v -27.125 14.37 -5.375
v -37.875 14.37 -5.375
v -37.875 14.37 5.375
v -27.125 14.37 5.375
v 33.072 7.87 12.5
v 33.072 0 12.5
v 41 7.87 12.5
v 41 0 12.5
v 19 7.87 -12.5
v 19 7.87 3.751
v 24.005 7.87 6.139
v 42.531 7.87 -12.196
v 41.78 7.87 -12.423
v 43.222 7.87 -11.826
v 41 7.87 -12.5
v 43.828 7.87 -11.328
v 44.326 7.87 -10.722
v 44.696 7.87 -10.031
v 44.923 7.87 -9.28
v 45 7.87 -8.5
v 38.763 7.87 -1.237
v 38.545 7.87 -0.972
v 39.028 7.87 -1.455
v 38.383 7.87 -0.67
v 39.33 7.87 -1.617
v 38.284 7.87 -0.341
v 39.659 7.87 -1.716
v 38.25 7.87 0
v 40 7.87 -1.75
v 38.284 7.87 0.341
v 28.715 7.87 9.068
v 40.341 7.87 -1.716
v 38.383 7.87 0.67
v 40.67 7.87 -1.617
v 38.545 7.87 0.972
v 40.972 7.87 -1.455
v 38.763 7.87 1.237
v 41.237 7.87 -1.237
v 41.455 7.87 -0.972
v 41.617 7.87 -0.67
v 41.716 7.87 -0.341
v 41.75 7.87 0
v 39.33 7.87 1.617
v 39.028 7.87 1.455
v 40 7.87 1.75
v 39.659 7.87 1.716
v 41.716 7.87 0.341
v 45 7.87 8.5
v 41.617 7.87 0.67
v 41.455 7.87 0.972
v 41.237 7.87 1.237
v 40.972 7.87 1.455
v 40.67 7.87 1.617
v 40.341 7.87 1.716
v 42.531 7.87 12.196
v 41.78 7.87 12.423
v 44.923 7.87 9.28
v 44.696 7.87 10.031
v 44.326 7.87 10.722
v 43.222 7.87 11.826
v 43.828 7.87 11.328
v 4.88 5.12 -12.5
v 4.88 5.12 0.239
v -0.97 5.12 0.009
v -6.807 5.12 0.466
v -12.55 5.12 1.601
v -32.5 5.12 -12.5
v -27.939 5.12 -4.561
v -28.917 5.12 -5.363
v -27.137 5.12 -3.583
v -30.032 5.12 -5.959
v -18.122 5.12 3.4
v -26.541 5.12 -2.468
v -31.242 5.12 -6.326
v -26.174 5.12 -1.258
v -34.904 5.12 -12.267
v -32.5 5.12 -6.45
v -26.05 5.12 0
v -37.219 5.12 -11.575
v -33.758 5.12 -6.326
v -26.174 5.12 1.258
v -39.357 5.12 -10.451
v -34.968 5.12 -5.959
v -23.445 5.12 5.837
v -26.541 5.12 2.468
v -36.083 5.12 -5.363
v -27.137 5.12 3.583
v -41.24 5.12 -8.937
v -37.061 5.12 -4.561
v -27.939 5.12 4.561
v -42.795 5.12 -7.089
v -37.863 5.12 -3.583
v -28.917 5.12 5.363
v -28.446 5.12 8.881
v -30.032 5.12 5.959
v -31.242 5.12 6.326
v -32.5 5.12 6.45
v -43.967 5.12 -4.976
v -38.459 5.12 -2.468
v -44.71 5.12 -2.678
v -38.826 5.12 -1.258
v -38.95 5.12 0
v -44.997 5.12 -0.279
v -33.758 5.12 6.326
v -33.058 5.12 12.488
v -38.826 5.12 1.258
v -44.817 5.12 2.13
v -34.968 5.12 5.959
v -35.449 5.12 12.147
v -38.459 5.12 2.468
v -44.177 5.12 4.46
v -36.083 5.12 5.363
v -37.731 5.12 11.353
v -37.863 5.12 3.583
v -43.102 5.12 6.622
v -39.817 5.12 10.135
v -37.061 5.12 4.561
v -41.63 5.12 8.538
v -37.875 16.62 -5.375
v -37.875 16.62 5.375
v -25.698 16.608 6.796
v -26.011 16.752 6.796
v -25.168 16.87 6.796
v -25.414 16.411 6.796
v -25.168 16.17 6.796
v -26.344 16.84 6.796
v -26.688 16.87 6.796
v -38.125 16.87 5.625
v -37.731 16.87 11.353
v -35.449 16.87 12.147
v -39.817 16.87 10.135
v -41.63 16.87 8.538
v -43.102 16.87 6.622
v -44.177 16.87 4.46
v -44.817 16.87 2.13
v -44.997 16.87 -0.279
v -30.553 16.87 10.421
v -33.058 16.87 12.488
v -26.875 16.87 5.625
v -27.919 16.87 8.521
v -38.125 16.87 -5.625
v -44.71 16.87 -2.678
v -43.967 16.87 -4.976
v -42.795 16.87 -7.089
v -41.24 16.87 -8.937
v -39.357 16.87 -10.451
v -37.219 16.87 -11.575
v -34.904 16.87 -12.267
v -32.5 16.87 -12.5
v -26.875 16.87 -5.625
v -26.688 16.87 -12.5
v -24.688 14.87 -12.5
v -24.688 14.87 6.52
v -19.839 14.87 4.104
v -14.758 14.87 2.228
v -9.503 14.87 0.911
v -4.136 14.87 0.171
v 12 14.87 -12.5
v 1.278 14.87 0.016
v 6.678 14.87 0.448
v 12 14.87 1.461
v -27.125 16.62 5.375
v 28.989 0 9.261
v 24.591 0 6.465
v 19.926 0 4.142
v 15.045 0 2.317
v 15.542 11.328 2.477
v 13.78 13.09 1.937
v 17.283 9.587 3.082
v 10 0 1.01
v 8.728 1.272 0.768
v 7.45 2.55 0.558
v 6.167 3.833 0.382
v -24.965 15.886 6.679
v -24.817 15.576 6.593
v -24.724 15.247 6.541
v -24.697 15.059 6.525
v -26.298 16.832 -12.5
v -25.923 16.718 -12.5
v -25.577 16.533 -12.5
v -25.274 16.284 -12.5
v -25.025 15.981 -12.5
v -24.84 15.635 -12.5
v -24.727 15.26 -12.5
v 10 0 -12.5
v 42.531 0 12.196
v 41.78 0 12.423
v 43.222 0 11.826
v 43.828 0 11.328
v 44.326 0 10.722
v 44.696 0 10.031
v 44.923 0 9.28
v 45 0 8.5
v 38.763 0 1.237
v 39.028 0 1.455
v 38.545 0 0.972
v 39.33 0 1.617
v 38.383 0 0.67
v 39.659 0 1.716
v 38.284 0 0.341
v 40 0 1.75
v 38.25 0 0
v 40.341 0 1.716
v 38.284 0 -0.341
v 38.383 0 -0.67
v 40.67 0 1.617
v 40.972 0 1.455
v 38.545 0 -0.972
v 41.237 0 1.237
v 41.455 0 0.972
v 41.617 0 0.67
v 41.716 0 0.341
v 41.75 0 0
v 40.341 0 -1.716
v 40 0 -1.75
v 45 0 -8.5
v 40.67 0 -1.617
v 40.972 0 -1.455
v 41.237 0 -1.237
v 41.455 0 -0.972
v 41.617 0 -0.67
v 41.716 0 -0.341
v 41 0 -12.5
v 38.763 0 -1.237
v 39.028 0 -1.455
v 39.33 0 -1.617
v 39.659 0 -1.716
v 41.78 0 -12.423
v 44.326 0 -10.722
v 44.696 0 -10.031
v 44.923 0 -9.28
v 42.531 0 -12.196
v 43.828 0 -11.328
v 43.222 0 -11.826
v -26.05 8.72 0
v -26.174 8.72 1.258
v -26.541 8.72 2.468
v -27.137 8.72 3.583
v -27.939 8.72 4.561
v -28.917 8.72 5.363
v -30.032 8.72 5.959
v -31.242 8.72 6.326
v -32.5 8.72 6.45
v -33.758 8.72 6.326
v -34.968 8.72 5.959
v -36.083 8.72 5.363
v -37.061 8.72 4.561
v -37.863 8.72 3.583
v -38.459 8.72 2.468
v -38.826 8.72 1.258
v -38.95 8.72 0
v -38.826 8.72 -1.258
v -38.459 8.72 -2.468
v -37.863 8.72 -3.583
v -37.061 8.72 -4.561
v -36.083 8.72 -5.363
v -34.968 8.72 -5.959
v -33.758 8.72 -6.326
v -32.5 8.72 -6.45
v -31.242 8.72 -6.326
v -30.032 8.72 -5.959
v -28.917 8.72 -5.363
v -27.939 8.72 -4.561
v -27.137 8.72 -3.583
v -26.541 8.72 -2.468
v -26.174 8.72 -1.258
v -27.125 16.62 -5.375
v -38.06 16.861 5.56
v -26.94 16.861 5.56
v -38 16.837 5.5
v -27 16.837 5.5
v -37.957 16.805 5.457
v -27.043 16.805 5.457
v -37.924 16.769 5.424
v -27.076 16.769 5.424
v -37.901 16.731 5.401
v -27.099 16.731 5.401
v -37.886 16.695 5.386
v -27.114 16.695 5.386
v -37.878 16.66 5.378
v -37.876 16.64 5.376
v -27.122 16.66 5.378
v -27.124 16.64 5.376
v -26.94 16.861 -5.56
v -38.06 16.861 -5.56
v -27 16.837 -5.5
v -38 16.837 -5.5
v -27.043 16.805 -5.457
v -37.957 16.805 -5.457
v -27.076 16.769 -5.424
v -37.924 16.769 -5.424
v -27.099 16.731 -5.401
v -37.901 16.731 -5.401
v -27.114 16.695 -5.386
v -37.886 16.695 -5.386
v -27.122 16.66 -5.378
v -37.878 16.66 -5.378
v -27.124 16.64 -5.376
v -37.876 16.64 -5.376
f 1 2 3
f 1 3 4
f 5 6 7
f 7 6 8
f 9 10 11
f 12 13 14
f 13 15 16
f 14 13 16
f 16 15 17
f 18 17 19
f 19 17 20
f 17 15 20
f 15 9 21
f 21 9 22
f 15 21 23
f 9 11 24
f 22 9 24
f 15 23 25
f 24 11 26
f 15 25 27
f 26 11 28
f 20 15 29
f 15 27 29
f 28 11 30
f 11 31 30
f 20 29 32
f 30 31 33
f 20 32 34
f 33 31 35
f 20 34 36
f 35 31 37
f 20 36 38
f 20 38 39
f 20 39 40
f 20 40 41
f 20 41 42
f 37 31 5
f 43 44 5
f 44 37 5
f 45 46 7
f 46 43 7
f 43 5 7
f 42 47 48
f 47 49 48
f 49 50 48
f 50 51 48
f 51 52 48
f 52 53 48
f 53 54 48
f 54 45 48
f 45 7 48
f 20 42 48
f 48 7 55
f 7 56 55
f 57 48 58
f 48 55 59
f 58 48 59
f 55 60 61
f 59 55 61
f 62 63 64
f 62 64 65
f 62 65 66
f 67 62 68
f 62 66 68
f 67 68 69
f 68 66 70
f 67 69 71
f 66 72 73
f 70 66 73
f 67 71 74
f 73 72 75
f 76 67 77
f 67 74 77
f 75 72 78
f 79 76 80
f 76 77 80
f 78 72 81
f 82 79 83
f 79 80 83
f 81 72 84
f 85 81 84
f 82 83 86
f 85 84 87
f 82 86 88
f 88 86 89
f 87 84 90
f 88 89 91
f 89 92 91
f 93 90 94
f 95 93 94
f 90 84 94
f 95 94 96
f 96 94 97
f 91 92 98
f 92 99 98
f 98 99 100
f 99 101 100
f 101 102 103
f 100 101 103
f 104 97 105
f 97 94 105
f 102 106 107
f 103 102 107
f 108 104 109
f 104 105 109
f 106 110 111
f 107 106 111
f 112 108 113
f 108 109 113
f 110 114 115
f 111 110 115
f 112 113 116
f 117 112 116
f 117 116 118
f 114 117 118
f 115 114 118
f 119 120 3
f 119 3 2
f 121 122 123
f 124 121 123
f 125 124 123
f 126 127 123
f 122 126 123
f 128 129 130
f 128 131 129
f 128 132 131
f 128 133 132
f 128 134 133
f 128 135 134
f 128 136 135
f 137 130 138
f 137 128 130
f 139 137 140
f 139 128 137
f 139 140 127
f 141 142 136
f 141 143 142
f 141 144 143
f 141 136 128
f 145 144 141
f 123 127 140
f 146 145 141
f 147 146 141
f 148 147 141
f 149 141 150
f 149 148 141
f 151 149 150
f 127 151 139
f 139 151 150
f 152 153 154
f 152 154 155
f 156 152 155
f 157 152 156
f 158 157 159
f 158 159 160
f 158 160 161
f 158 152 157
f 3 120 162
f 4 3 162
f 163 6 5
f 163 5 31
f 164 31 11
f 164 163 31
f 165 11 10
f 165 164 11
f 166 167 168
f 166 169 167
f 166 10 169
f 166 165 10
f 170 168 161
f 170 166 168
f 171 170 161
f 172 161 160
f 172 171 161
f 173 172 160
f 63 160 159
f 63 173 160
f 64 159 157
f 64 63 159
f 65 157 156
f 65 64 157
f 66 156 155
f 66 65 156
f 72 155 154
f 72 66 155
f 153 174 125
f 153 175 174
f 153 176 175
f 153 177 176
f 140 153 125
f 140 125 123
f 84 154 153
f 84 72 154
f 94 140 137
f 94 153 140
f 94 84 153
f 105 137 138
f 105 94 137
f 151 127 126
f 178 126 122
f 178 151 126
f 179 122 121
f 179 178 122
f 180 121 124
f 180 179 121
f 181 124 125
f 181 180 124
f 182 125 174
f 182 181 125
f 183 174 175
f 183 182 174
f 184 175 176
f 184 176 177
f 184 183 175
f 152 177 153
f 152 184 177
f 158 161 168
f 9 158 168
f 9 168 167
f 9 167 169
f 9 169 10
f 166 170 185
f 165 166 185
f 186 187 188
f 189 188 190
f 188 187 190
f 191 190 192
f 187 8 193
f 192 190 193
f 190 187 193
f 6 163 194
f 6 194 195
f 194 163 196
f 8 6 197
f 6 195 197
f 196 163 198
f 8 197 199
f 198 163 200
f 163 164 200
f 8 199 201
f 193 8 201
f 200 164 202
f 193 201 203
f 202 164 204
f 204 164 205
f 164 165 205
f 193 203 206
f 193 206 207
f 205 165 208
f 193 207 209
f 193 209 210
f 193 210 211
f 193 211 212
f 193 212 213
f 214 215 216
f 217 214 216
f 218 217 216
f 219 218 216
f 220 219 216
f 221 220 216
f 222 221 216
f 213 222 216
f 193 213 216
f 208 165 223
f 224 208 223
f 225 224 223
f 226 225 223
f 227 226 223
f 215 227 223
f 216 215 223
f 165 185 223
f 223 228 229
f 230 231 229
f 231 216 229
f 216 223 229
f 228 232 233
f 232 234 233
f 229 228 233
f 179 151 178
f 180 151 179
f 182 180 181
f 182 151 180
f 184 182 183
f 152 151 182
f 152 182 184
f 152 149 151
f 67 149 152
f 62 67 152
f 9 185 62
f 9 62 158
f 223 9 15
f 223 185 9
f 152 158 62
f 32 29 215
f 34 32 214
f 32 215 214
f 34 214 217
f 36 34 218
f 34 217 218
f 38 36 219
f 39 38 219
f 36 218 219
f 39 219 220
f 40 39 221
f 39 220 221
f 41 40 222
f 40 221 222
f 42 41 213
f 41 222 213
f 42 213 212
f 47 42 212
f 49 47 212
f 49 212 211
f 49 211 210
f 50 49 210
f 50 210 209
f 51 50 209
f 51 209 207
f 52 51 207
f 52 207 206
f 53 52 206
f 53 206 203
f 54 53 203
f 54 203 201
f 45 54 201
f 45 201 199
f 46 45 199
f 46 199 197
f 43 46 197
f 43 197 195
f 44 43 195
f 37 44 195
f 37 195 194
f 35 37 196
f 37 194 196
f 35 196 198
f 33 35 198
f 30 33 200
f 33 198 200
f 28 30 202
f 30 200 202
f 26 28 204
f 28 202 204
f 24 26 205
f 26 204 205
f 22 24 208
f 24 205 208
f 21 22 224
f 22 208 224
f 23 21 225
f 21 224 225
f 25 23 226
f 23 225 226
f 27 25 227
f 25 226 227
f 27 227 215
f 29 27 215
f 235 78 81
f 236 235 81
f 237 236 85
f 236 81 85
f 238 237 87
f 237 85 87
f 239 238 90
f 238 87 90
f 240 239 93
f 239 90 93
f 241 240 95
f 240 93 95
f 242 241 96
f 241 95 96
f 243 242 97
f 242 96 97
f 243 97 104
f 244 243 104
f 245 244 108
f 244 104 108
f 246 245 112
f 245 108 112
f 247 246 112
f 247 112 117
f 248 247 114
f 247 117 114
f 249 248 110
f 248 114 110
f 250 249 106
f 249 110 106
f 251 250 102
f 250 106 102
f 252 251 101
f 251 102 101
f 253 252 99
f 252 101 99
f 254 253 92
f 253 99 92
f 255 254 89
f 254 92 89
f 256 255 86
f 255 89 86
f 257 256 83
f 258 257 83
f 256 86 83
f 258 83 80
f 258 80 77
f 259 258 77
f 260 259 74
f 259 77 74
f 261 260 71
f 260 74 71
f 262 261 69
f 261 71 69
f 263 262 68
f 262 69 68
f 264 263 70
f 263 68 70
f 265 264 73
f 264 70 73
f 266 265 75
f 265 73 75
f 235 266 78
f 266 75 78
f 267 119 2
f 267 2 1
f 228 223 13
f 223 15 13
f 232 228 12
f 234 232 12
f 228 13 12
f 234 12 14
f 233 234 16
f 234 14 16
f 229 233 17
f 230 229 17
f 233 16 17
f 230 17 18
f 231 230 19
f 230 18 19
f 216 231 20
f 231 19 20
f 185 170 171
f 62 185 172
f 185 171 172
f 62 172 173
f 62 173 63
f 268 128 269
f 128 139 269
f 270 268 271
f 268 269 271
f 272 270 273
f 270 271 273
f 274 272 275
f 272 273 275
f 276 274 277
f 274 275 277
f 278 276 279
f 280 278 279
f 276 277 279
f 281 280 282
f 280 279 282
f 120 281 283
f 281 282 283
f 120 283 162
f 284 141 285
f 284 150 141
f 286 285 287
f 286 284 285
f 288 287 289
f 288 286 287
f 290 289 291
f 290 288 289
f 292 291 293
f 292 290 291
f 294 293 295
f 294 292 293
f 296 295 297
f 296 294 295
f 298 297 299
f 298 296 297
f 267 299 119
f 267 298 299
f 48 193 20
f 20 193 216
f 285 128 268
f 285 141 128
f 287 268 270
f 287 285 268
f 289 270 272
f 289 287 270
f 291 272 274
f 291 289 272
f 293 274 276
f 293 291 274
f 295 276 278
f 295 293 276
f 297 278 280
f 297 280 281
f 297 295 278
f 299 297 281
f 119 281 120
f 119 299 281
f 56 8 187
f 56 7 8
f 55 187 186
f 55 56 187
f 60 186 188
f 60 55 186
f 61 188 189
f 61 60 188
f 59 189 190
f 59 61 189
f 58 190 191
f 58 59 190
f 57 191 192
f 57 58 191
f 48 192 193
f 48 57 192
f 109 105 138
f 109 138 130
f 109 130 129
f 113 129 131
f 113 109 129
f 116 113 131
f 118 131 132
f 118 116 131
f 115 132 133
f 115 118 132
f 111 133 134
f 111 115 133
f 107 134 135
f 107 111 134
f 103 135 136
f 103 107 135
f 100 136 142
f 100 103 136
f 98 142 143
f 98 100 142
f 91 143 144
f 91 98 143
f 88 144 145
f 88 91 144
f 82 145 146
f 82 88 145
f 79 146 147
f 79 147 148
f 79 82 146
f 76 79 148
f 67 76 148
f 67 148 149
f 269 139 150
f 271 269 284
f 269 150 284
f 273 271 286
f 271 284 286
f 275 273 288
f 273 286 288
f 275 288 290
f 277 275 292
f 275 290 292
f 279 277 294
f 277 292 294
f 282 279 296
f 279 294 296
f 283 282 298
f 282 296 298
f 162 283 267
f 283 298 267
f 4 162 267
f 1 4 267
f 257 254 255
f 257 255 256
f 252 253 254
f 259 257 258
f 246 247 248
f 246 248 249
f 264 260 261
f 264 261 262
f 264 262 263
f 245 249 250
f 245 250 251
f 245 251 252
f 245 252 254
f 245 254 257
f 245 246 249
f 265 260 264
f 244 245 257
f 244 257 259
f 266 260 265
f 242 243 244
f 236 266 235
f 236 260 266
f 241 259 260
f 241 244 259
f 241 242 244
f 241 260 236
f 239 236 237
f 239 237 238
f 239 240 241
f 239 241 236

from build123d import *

# Parameters (mm, degrees)
SKETCH1_W                    = 90
SKETCH1_H                    = 25
BOSS_EXTRUDE1_DEPTH          = 16.87
SKETCH3_W                    = 10.75
SKETCH3_H                    = 10.75
CUT_EXTRUDE2_DEPTH           = 2.5
ENL_V_MAT_EXTRU_1_DEPTH      = 34
FILLET1_RADIUS               = 12.5
FILLET1_LENGTH               = 11.75
ESQUISSE5_R                  = 1.75
ENL_V_MAT_EXTRU_4_DEPTH      = 50.65729453
FILLET3_R                    = 4
SKETCH8_W                    = 38.029495875
SKETCH8_H                    = 20.943583685
CUT_EXTRUDE6_DEPTH           = 2
FILLET6_R                    = 2
FILLET7_R                    = 0.25
ESQUISSE17_R                 = 6.45
ENL_V_MAT_EXTRU_7_DEPTH      = 3.6
ENL_V_MAT_EXTRU_8_DEPTH      = 50.65729453
ENL_V_MAT_EXTRU_8_DEPTH_BACK = 50.65729453
ESQUISSE18_R                 = 50


with BuildPart() as part:
    # Sketch1 → Boss-Extrude1 (new body)
    with BuildSketch(Plane(origin=(0, 0, 0), x_dir=(1, 0, 0), z_dir=(0, 1, 0))):
        Rectangle(SKETCH1_W, SKETCH1_H)
    extrude(amount=BOSS_EXTRUDE1_DEPTH)

    # Sketch3 → Cut-Extrude2 (cut)
    with BuildSketch(Plane(origin=(0, 16.87, 0), x_dir=(1, 0, 0), z_dir=(0, 1, 0))):
        with Locations((-32.5, 0)):
            Rectangle(SKETCH3_W, SKETCH3_H)
    extrude(amount=-CUT_EXTRUDE2_DEPTH, mode=Mode.SUBTRACT)

    # Esquisse2 → Enlèv. mat.-Extru.1 (cut)
    with BuildSketch(Plane.XY.offset(12.5)):
        Polygon((45, 16.87), (10, 16.87), (19, 7.87), (45, 7.87), align=None)
        Polygon((-45, 0), (10, 0), (4.88, 5.12), (-45, 5.12), align=None)
    extrude(amount=-ENL_V_MAT_EXTRU_1_DEPTH, mode=Mode.SUBTRACT)

    # Fillet1: full round fillet: the end face becomes a half cylinder, R = half its width
    fillet1_face = Plane((-45, 10.995, 0), x_dir=(0, -1, 0), z_dir=(-1, 0, 0))  # on the end face: x along it, z out of the body
    fillet1_slab = fillet1_face.offset(-FILLET1_RADIUS / 2) * Box(FILLET1_LENGTH, 2 * FILLET1_RADIUS, FILLET1_RADIUS, mode=Mode.PRIVATE)  # the body's end, R deep
    fillet1_round = Plane((-32.5, 10.995, 0), x_dir=(-1, 0, 0), z_dir=(0, -1, 0)) * Cylinder(FILLET1_RADIUS, FILLET1_LENGTH, mode=Mode.PRIVATE)  # its axis R under the face
    add(fillet1_slab - fillet1_round, mode=Mode.SUBTRACT)

    # Esquisse5 → Enlèv. mat.-Extru.4 (cut, through all)
    with BuildSketch(Plane(origin=(0, 0, 0), x_dir=(-1, 0, 0), z_dir=(0, -1, 0))):
        with Locations(Location((-40, 0, 0), (0, 0, 90))):
            Circle(ESQUISSE5_R)
    extrude(amount=-ENL_V_MAT_EXTRU_4_DEPTH, mode=Mode.SUBTRACT)

    # Fillet3
    fillet3_edges = [part.edges().sort_by_distance(p)[0] for p in [
        (45, 3.935, -12.5),
        (45, 3.935, 12.5),
    ]]
    fillet(fillet3_edges, radius=FILLET3_R)

    # Sketch8 → Cut-Extrude6 (cut)
    with BuildSketch(Plane(origin=(0, 16.87, 0), x_dir=(1, 0, 0), z_dir=(0, 1, 0))):
        with Locations((-5.673362901, 3.675760168)):
            Rectangle(SKETCH8_W, SKETCH8_H)
    extrude(amount=-CUT_EXTRUDE6_DEPTH, mode=Mode.SUBTRACT)

    # Fillet6
    fillet6_edges = [part.edges().sort_by_distance(p)[0] for p in [
        (-24.688110839, 16.87, -2.851984162),
    ]]
    fillet(fillet6_edges, radius=FILLET6_R - 0.0001)  # a hair under: the kernel refuses the full size

    # Fillet7
    fillet7_edges = [part.edges().sort_by_distance(p)[0] for p in [
        (-37.875, 16.87, 0),
        (-32.5, 16.87, 5.375),
        (-27.125, 16.87, 0),
        (-32.5, 16.87, -5.375),
    ]]
    fillet(fillet7_edges, radius=FILLET7_R)

    # Esquisse17 → Enlèv. mat.-Extru.7 (cut)
    with BuildSketch(Plane.XZ.offset(-5.12)):
        with Locations((-32.5, 0)):
            Circle(ESQUISSE17_R)
    extrude(amount=-ENL_V_MAT_EXTRU_7_DEPTH, mode=Mode.SUBTRACT)

    # Esquisse18 → Enlèv. mat.-Extru.8 (cut, two sides: drawn at the far end of the back side and taken through both)
    with BuildSketch(Plane(origin=(0, 0, 0), x_dir=(1, 0, 0), z_dir=(0, 1, 0)).offset(-ENL_V_MAT_EXTRU_8_DEPTH_BACK)):
        with Locations((0, -50)):
            Circle(ESQUISSE18_R)
    extrude(amount=ENL_V_MAT_EXTRU_8_DEPTH + ENL_V_MAT_EXTRU_8_DEPTH_BACK, mode=Mode.SUBTRACT)


solid = part.part
